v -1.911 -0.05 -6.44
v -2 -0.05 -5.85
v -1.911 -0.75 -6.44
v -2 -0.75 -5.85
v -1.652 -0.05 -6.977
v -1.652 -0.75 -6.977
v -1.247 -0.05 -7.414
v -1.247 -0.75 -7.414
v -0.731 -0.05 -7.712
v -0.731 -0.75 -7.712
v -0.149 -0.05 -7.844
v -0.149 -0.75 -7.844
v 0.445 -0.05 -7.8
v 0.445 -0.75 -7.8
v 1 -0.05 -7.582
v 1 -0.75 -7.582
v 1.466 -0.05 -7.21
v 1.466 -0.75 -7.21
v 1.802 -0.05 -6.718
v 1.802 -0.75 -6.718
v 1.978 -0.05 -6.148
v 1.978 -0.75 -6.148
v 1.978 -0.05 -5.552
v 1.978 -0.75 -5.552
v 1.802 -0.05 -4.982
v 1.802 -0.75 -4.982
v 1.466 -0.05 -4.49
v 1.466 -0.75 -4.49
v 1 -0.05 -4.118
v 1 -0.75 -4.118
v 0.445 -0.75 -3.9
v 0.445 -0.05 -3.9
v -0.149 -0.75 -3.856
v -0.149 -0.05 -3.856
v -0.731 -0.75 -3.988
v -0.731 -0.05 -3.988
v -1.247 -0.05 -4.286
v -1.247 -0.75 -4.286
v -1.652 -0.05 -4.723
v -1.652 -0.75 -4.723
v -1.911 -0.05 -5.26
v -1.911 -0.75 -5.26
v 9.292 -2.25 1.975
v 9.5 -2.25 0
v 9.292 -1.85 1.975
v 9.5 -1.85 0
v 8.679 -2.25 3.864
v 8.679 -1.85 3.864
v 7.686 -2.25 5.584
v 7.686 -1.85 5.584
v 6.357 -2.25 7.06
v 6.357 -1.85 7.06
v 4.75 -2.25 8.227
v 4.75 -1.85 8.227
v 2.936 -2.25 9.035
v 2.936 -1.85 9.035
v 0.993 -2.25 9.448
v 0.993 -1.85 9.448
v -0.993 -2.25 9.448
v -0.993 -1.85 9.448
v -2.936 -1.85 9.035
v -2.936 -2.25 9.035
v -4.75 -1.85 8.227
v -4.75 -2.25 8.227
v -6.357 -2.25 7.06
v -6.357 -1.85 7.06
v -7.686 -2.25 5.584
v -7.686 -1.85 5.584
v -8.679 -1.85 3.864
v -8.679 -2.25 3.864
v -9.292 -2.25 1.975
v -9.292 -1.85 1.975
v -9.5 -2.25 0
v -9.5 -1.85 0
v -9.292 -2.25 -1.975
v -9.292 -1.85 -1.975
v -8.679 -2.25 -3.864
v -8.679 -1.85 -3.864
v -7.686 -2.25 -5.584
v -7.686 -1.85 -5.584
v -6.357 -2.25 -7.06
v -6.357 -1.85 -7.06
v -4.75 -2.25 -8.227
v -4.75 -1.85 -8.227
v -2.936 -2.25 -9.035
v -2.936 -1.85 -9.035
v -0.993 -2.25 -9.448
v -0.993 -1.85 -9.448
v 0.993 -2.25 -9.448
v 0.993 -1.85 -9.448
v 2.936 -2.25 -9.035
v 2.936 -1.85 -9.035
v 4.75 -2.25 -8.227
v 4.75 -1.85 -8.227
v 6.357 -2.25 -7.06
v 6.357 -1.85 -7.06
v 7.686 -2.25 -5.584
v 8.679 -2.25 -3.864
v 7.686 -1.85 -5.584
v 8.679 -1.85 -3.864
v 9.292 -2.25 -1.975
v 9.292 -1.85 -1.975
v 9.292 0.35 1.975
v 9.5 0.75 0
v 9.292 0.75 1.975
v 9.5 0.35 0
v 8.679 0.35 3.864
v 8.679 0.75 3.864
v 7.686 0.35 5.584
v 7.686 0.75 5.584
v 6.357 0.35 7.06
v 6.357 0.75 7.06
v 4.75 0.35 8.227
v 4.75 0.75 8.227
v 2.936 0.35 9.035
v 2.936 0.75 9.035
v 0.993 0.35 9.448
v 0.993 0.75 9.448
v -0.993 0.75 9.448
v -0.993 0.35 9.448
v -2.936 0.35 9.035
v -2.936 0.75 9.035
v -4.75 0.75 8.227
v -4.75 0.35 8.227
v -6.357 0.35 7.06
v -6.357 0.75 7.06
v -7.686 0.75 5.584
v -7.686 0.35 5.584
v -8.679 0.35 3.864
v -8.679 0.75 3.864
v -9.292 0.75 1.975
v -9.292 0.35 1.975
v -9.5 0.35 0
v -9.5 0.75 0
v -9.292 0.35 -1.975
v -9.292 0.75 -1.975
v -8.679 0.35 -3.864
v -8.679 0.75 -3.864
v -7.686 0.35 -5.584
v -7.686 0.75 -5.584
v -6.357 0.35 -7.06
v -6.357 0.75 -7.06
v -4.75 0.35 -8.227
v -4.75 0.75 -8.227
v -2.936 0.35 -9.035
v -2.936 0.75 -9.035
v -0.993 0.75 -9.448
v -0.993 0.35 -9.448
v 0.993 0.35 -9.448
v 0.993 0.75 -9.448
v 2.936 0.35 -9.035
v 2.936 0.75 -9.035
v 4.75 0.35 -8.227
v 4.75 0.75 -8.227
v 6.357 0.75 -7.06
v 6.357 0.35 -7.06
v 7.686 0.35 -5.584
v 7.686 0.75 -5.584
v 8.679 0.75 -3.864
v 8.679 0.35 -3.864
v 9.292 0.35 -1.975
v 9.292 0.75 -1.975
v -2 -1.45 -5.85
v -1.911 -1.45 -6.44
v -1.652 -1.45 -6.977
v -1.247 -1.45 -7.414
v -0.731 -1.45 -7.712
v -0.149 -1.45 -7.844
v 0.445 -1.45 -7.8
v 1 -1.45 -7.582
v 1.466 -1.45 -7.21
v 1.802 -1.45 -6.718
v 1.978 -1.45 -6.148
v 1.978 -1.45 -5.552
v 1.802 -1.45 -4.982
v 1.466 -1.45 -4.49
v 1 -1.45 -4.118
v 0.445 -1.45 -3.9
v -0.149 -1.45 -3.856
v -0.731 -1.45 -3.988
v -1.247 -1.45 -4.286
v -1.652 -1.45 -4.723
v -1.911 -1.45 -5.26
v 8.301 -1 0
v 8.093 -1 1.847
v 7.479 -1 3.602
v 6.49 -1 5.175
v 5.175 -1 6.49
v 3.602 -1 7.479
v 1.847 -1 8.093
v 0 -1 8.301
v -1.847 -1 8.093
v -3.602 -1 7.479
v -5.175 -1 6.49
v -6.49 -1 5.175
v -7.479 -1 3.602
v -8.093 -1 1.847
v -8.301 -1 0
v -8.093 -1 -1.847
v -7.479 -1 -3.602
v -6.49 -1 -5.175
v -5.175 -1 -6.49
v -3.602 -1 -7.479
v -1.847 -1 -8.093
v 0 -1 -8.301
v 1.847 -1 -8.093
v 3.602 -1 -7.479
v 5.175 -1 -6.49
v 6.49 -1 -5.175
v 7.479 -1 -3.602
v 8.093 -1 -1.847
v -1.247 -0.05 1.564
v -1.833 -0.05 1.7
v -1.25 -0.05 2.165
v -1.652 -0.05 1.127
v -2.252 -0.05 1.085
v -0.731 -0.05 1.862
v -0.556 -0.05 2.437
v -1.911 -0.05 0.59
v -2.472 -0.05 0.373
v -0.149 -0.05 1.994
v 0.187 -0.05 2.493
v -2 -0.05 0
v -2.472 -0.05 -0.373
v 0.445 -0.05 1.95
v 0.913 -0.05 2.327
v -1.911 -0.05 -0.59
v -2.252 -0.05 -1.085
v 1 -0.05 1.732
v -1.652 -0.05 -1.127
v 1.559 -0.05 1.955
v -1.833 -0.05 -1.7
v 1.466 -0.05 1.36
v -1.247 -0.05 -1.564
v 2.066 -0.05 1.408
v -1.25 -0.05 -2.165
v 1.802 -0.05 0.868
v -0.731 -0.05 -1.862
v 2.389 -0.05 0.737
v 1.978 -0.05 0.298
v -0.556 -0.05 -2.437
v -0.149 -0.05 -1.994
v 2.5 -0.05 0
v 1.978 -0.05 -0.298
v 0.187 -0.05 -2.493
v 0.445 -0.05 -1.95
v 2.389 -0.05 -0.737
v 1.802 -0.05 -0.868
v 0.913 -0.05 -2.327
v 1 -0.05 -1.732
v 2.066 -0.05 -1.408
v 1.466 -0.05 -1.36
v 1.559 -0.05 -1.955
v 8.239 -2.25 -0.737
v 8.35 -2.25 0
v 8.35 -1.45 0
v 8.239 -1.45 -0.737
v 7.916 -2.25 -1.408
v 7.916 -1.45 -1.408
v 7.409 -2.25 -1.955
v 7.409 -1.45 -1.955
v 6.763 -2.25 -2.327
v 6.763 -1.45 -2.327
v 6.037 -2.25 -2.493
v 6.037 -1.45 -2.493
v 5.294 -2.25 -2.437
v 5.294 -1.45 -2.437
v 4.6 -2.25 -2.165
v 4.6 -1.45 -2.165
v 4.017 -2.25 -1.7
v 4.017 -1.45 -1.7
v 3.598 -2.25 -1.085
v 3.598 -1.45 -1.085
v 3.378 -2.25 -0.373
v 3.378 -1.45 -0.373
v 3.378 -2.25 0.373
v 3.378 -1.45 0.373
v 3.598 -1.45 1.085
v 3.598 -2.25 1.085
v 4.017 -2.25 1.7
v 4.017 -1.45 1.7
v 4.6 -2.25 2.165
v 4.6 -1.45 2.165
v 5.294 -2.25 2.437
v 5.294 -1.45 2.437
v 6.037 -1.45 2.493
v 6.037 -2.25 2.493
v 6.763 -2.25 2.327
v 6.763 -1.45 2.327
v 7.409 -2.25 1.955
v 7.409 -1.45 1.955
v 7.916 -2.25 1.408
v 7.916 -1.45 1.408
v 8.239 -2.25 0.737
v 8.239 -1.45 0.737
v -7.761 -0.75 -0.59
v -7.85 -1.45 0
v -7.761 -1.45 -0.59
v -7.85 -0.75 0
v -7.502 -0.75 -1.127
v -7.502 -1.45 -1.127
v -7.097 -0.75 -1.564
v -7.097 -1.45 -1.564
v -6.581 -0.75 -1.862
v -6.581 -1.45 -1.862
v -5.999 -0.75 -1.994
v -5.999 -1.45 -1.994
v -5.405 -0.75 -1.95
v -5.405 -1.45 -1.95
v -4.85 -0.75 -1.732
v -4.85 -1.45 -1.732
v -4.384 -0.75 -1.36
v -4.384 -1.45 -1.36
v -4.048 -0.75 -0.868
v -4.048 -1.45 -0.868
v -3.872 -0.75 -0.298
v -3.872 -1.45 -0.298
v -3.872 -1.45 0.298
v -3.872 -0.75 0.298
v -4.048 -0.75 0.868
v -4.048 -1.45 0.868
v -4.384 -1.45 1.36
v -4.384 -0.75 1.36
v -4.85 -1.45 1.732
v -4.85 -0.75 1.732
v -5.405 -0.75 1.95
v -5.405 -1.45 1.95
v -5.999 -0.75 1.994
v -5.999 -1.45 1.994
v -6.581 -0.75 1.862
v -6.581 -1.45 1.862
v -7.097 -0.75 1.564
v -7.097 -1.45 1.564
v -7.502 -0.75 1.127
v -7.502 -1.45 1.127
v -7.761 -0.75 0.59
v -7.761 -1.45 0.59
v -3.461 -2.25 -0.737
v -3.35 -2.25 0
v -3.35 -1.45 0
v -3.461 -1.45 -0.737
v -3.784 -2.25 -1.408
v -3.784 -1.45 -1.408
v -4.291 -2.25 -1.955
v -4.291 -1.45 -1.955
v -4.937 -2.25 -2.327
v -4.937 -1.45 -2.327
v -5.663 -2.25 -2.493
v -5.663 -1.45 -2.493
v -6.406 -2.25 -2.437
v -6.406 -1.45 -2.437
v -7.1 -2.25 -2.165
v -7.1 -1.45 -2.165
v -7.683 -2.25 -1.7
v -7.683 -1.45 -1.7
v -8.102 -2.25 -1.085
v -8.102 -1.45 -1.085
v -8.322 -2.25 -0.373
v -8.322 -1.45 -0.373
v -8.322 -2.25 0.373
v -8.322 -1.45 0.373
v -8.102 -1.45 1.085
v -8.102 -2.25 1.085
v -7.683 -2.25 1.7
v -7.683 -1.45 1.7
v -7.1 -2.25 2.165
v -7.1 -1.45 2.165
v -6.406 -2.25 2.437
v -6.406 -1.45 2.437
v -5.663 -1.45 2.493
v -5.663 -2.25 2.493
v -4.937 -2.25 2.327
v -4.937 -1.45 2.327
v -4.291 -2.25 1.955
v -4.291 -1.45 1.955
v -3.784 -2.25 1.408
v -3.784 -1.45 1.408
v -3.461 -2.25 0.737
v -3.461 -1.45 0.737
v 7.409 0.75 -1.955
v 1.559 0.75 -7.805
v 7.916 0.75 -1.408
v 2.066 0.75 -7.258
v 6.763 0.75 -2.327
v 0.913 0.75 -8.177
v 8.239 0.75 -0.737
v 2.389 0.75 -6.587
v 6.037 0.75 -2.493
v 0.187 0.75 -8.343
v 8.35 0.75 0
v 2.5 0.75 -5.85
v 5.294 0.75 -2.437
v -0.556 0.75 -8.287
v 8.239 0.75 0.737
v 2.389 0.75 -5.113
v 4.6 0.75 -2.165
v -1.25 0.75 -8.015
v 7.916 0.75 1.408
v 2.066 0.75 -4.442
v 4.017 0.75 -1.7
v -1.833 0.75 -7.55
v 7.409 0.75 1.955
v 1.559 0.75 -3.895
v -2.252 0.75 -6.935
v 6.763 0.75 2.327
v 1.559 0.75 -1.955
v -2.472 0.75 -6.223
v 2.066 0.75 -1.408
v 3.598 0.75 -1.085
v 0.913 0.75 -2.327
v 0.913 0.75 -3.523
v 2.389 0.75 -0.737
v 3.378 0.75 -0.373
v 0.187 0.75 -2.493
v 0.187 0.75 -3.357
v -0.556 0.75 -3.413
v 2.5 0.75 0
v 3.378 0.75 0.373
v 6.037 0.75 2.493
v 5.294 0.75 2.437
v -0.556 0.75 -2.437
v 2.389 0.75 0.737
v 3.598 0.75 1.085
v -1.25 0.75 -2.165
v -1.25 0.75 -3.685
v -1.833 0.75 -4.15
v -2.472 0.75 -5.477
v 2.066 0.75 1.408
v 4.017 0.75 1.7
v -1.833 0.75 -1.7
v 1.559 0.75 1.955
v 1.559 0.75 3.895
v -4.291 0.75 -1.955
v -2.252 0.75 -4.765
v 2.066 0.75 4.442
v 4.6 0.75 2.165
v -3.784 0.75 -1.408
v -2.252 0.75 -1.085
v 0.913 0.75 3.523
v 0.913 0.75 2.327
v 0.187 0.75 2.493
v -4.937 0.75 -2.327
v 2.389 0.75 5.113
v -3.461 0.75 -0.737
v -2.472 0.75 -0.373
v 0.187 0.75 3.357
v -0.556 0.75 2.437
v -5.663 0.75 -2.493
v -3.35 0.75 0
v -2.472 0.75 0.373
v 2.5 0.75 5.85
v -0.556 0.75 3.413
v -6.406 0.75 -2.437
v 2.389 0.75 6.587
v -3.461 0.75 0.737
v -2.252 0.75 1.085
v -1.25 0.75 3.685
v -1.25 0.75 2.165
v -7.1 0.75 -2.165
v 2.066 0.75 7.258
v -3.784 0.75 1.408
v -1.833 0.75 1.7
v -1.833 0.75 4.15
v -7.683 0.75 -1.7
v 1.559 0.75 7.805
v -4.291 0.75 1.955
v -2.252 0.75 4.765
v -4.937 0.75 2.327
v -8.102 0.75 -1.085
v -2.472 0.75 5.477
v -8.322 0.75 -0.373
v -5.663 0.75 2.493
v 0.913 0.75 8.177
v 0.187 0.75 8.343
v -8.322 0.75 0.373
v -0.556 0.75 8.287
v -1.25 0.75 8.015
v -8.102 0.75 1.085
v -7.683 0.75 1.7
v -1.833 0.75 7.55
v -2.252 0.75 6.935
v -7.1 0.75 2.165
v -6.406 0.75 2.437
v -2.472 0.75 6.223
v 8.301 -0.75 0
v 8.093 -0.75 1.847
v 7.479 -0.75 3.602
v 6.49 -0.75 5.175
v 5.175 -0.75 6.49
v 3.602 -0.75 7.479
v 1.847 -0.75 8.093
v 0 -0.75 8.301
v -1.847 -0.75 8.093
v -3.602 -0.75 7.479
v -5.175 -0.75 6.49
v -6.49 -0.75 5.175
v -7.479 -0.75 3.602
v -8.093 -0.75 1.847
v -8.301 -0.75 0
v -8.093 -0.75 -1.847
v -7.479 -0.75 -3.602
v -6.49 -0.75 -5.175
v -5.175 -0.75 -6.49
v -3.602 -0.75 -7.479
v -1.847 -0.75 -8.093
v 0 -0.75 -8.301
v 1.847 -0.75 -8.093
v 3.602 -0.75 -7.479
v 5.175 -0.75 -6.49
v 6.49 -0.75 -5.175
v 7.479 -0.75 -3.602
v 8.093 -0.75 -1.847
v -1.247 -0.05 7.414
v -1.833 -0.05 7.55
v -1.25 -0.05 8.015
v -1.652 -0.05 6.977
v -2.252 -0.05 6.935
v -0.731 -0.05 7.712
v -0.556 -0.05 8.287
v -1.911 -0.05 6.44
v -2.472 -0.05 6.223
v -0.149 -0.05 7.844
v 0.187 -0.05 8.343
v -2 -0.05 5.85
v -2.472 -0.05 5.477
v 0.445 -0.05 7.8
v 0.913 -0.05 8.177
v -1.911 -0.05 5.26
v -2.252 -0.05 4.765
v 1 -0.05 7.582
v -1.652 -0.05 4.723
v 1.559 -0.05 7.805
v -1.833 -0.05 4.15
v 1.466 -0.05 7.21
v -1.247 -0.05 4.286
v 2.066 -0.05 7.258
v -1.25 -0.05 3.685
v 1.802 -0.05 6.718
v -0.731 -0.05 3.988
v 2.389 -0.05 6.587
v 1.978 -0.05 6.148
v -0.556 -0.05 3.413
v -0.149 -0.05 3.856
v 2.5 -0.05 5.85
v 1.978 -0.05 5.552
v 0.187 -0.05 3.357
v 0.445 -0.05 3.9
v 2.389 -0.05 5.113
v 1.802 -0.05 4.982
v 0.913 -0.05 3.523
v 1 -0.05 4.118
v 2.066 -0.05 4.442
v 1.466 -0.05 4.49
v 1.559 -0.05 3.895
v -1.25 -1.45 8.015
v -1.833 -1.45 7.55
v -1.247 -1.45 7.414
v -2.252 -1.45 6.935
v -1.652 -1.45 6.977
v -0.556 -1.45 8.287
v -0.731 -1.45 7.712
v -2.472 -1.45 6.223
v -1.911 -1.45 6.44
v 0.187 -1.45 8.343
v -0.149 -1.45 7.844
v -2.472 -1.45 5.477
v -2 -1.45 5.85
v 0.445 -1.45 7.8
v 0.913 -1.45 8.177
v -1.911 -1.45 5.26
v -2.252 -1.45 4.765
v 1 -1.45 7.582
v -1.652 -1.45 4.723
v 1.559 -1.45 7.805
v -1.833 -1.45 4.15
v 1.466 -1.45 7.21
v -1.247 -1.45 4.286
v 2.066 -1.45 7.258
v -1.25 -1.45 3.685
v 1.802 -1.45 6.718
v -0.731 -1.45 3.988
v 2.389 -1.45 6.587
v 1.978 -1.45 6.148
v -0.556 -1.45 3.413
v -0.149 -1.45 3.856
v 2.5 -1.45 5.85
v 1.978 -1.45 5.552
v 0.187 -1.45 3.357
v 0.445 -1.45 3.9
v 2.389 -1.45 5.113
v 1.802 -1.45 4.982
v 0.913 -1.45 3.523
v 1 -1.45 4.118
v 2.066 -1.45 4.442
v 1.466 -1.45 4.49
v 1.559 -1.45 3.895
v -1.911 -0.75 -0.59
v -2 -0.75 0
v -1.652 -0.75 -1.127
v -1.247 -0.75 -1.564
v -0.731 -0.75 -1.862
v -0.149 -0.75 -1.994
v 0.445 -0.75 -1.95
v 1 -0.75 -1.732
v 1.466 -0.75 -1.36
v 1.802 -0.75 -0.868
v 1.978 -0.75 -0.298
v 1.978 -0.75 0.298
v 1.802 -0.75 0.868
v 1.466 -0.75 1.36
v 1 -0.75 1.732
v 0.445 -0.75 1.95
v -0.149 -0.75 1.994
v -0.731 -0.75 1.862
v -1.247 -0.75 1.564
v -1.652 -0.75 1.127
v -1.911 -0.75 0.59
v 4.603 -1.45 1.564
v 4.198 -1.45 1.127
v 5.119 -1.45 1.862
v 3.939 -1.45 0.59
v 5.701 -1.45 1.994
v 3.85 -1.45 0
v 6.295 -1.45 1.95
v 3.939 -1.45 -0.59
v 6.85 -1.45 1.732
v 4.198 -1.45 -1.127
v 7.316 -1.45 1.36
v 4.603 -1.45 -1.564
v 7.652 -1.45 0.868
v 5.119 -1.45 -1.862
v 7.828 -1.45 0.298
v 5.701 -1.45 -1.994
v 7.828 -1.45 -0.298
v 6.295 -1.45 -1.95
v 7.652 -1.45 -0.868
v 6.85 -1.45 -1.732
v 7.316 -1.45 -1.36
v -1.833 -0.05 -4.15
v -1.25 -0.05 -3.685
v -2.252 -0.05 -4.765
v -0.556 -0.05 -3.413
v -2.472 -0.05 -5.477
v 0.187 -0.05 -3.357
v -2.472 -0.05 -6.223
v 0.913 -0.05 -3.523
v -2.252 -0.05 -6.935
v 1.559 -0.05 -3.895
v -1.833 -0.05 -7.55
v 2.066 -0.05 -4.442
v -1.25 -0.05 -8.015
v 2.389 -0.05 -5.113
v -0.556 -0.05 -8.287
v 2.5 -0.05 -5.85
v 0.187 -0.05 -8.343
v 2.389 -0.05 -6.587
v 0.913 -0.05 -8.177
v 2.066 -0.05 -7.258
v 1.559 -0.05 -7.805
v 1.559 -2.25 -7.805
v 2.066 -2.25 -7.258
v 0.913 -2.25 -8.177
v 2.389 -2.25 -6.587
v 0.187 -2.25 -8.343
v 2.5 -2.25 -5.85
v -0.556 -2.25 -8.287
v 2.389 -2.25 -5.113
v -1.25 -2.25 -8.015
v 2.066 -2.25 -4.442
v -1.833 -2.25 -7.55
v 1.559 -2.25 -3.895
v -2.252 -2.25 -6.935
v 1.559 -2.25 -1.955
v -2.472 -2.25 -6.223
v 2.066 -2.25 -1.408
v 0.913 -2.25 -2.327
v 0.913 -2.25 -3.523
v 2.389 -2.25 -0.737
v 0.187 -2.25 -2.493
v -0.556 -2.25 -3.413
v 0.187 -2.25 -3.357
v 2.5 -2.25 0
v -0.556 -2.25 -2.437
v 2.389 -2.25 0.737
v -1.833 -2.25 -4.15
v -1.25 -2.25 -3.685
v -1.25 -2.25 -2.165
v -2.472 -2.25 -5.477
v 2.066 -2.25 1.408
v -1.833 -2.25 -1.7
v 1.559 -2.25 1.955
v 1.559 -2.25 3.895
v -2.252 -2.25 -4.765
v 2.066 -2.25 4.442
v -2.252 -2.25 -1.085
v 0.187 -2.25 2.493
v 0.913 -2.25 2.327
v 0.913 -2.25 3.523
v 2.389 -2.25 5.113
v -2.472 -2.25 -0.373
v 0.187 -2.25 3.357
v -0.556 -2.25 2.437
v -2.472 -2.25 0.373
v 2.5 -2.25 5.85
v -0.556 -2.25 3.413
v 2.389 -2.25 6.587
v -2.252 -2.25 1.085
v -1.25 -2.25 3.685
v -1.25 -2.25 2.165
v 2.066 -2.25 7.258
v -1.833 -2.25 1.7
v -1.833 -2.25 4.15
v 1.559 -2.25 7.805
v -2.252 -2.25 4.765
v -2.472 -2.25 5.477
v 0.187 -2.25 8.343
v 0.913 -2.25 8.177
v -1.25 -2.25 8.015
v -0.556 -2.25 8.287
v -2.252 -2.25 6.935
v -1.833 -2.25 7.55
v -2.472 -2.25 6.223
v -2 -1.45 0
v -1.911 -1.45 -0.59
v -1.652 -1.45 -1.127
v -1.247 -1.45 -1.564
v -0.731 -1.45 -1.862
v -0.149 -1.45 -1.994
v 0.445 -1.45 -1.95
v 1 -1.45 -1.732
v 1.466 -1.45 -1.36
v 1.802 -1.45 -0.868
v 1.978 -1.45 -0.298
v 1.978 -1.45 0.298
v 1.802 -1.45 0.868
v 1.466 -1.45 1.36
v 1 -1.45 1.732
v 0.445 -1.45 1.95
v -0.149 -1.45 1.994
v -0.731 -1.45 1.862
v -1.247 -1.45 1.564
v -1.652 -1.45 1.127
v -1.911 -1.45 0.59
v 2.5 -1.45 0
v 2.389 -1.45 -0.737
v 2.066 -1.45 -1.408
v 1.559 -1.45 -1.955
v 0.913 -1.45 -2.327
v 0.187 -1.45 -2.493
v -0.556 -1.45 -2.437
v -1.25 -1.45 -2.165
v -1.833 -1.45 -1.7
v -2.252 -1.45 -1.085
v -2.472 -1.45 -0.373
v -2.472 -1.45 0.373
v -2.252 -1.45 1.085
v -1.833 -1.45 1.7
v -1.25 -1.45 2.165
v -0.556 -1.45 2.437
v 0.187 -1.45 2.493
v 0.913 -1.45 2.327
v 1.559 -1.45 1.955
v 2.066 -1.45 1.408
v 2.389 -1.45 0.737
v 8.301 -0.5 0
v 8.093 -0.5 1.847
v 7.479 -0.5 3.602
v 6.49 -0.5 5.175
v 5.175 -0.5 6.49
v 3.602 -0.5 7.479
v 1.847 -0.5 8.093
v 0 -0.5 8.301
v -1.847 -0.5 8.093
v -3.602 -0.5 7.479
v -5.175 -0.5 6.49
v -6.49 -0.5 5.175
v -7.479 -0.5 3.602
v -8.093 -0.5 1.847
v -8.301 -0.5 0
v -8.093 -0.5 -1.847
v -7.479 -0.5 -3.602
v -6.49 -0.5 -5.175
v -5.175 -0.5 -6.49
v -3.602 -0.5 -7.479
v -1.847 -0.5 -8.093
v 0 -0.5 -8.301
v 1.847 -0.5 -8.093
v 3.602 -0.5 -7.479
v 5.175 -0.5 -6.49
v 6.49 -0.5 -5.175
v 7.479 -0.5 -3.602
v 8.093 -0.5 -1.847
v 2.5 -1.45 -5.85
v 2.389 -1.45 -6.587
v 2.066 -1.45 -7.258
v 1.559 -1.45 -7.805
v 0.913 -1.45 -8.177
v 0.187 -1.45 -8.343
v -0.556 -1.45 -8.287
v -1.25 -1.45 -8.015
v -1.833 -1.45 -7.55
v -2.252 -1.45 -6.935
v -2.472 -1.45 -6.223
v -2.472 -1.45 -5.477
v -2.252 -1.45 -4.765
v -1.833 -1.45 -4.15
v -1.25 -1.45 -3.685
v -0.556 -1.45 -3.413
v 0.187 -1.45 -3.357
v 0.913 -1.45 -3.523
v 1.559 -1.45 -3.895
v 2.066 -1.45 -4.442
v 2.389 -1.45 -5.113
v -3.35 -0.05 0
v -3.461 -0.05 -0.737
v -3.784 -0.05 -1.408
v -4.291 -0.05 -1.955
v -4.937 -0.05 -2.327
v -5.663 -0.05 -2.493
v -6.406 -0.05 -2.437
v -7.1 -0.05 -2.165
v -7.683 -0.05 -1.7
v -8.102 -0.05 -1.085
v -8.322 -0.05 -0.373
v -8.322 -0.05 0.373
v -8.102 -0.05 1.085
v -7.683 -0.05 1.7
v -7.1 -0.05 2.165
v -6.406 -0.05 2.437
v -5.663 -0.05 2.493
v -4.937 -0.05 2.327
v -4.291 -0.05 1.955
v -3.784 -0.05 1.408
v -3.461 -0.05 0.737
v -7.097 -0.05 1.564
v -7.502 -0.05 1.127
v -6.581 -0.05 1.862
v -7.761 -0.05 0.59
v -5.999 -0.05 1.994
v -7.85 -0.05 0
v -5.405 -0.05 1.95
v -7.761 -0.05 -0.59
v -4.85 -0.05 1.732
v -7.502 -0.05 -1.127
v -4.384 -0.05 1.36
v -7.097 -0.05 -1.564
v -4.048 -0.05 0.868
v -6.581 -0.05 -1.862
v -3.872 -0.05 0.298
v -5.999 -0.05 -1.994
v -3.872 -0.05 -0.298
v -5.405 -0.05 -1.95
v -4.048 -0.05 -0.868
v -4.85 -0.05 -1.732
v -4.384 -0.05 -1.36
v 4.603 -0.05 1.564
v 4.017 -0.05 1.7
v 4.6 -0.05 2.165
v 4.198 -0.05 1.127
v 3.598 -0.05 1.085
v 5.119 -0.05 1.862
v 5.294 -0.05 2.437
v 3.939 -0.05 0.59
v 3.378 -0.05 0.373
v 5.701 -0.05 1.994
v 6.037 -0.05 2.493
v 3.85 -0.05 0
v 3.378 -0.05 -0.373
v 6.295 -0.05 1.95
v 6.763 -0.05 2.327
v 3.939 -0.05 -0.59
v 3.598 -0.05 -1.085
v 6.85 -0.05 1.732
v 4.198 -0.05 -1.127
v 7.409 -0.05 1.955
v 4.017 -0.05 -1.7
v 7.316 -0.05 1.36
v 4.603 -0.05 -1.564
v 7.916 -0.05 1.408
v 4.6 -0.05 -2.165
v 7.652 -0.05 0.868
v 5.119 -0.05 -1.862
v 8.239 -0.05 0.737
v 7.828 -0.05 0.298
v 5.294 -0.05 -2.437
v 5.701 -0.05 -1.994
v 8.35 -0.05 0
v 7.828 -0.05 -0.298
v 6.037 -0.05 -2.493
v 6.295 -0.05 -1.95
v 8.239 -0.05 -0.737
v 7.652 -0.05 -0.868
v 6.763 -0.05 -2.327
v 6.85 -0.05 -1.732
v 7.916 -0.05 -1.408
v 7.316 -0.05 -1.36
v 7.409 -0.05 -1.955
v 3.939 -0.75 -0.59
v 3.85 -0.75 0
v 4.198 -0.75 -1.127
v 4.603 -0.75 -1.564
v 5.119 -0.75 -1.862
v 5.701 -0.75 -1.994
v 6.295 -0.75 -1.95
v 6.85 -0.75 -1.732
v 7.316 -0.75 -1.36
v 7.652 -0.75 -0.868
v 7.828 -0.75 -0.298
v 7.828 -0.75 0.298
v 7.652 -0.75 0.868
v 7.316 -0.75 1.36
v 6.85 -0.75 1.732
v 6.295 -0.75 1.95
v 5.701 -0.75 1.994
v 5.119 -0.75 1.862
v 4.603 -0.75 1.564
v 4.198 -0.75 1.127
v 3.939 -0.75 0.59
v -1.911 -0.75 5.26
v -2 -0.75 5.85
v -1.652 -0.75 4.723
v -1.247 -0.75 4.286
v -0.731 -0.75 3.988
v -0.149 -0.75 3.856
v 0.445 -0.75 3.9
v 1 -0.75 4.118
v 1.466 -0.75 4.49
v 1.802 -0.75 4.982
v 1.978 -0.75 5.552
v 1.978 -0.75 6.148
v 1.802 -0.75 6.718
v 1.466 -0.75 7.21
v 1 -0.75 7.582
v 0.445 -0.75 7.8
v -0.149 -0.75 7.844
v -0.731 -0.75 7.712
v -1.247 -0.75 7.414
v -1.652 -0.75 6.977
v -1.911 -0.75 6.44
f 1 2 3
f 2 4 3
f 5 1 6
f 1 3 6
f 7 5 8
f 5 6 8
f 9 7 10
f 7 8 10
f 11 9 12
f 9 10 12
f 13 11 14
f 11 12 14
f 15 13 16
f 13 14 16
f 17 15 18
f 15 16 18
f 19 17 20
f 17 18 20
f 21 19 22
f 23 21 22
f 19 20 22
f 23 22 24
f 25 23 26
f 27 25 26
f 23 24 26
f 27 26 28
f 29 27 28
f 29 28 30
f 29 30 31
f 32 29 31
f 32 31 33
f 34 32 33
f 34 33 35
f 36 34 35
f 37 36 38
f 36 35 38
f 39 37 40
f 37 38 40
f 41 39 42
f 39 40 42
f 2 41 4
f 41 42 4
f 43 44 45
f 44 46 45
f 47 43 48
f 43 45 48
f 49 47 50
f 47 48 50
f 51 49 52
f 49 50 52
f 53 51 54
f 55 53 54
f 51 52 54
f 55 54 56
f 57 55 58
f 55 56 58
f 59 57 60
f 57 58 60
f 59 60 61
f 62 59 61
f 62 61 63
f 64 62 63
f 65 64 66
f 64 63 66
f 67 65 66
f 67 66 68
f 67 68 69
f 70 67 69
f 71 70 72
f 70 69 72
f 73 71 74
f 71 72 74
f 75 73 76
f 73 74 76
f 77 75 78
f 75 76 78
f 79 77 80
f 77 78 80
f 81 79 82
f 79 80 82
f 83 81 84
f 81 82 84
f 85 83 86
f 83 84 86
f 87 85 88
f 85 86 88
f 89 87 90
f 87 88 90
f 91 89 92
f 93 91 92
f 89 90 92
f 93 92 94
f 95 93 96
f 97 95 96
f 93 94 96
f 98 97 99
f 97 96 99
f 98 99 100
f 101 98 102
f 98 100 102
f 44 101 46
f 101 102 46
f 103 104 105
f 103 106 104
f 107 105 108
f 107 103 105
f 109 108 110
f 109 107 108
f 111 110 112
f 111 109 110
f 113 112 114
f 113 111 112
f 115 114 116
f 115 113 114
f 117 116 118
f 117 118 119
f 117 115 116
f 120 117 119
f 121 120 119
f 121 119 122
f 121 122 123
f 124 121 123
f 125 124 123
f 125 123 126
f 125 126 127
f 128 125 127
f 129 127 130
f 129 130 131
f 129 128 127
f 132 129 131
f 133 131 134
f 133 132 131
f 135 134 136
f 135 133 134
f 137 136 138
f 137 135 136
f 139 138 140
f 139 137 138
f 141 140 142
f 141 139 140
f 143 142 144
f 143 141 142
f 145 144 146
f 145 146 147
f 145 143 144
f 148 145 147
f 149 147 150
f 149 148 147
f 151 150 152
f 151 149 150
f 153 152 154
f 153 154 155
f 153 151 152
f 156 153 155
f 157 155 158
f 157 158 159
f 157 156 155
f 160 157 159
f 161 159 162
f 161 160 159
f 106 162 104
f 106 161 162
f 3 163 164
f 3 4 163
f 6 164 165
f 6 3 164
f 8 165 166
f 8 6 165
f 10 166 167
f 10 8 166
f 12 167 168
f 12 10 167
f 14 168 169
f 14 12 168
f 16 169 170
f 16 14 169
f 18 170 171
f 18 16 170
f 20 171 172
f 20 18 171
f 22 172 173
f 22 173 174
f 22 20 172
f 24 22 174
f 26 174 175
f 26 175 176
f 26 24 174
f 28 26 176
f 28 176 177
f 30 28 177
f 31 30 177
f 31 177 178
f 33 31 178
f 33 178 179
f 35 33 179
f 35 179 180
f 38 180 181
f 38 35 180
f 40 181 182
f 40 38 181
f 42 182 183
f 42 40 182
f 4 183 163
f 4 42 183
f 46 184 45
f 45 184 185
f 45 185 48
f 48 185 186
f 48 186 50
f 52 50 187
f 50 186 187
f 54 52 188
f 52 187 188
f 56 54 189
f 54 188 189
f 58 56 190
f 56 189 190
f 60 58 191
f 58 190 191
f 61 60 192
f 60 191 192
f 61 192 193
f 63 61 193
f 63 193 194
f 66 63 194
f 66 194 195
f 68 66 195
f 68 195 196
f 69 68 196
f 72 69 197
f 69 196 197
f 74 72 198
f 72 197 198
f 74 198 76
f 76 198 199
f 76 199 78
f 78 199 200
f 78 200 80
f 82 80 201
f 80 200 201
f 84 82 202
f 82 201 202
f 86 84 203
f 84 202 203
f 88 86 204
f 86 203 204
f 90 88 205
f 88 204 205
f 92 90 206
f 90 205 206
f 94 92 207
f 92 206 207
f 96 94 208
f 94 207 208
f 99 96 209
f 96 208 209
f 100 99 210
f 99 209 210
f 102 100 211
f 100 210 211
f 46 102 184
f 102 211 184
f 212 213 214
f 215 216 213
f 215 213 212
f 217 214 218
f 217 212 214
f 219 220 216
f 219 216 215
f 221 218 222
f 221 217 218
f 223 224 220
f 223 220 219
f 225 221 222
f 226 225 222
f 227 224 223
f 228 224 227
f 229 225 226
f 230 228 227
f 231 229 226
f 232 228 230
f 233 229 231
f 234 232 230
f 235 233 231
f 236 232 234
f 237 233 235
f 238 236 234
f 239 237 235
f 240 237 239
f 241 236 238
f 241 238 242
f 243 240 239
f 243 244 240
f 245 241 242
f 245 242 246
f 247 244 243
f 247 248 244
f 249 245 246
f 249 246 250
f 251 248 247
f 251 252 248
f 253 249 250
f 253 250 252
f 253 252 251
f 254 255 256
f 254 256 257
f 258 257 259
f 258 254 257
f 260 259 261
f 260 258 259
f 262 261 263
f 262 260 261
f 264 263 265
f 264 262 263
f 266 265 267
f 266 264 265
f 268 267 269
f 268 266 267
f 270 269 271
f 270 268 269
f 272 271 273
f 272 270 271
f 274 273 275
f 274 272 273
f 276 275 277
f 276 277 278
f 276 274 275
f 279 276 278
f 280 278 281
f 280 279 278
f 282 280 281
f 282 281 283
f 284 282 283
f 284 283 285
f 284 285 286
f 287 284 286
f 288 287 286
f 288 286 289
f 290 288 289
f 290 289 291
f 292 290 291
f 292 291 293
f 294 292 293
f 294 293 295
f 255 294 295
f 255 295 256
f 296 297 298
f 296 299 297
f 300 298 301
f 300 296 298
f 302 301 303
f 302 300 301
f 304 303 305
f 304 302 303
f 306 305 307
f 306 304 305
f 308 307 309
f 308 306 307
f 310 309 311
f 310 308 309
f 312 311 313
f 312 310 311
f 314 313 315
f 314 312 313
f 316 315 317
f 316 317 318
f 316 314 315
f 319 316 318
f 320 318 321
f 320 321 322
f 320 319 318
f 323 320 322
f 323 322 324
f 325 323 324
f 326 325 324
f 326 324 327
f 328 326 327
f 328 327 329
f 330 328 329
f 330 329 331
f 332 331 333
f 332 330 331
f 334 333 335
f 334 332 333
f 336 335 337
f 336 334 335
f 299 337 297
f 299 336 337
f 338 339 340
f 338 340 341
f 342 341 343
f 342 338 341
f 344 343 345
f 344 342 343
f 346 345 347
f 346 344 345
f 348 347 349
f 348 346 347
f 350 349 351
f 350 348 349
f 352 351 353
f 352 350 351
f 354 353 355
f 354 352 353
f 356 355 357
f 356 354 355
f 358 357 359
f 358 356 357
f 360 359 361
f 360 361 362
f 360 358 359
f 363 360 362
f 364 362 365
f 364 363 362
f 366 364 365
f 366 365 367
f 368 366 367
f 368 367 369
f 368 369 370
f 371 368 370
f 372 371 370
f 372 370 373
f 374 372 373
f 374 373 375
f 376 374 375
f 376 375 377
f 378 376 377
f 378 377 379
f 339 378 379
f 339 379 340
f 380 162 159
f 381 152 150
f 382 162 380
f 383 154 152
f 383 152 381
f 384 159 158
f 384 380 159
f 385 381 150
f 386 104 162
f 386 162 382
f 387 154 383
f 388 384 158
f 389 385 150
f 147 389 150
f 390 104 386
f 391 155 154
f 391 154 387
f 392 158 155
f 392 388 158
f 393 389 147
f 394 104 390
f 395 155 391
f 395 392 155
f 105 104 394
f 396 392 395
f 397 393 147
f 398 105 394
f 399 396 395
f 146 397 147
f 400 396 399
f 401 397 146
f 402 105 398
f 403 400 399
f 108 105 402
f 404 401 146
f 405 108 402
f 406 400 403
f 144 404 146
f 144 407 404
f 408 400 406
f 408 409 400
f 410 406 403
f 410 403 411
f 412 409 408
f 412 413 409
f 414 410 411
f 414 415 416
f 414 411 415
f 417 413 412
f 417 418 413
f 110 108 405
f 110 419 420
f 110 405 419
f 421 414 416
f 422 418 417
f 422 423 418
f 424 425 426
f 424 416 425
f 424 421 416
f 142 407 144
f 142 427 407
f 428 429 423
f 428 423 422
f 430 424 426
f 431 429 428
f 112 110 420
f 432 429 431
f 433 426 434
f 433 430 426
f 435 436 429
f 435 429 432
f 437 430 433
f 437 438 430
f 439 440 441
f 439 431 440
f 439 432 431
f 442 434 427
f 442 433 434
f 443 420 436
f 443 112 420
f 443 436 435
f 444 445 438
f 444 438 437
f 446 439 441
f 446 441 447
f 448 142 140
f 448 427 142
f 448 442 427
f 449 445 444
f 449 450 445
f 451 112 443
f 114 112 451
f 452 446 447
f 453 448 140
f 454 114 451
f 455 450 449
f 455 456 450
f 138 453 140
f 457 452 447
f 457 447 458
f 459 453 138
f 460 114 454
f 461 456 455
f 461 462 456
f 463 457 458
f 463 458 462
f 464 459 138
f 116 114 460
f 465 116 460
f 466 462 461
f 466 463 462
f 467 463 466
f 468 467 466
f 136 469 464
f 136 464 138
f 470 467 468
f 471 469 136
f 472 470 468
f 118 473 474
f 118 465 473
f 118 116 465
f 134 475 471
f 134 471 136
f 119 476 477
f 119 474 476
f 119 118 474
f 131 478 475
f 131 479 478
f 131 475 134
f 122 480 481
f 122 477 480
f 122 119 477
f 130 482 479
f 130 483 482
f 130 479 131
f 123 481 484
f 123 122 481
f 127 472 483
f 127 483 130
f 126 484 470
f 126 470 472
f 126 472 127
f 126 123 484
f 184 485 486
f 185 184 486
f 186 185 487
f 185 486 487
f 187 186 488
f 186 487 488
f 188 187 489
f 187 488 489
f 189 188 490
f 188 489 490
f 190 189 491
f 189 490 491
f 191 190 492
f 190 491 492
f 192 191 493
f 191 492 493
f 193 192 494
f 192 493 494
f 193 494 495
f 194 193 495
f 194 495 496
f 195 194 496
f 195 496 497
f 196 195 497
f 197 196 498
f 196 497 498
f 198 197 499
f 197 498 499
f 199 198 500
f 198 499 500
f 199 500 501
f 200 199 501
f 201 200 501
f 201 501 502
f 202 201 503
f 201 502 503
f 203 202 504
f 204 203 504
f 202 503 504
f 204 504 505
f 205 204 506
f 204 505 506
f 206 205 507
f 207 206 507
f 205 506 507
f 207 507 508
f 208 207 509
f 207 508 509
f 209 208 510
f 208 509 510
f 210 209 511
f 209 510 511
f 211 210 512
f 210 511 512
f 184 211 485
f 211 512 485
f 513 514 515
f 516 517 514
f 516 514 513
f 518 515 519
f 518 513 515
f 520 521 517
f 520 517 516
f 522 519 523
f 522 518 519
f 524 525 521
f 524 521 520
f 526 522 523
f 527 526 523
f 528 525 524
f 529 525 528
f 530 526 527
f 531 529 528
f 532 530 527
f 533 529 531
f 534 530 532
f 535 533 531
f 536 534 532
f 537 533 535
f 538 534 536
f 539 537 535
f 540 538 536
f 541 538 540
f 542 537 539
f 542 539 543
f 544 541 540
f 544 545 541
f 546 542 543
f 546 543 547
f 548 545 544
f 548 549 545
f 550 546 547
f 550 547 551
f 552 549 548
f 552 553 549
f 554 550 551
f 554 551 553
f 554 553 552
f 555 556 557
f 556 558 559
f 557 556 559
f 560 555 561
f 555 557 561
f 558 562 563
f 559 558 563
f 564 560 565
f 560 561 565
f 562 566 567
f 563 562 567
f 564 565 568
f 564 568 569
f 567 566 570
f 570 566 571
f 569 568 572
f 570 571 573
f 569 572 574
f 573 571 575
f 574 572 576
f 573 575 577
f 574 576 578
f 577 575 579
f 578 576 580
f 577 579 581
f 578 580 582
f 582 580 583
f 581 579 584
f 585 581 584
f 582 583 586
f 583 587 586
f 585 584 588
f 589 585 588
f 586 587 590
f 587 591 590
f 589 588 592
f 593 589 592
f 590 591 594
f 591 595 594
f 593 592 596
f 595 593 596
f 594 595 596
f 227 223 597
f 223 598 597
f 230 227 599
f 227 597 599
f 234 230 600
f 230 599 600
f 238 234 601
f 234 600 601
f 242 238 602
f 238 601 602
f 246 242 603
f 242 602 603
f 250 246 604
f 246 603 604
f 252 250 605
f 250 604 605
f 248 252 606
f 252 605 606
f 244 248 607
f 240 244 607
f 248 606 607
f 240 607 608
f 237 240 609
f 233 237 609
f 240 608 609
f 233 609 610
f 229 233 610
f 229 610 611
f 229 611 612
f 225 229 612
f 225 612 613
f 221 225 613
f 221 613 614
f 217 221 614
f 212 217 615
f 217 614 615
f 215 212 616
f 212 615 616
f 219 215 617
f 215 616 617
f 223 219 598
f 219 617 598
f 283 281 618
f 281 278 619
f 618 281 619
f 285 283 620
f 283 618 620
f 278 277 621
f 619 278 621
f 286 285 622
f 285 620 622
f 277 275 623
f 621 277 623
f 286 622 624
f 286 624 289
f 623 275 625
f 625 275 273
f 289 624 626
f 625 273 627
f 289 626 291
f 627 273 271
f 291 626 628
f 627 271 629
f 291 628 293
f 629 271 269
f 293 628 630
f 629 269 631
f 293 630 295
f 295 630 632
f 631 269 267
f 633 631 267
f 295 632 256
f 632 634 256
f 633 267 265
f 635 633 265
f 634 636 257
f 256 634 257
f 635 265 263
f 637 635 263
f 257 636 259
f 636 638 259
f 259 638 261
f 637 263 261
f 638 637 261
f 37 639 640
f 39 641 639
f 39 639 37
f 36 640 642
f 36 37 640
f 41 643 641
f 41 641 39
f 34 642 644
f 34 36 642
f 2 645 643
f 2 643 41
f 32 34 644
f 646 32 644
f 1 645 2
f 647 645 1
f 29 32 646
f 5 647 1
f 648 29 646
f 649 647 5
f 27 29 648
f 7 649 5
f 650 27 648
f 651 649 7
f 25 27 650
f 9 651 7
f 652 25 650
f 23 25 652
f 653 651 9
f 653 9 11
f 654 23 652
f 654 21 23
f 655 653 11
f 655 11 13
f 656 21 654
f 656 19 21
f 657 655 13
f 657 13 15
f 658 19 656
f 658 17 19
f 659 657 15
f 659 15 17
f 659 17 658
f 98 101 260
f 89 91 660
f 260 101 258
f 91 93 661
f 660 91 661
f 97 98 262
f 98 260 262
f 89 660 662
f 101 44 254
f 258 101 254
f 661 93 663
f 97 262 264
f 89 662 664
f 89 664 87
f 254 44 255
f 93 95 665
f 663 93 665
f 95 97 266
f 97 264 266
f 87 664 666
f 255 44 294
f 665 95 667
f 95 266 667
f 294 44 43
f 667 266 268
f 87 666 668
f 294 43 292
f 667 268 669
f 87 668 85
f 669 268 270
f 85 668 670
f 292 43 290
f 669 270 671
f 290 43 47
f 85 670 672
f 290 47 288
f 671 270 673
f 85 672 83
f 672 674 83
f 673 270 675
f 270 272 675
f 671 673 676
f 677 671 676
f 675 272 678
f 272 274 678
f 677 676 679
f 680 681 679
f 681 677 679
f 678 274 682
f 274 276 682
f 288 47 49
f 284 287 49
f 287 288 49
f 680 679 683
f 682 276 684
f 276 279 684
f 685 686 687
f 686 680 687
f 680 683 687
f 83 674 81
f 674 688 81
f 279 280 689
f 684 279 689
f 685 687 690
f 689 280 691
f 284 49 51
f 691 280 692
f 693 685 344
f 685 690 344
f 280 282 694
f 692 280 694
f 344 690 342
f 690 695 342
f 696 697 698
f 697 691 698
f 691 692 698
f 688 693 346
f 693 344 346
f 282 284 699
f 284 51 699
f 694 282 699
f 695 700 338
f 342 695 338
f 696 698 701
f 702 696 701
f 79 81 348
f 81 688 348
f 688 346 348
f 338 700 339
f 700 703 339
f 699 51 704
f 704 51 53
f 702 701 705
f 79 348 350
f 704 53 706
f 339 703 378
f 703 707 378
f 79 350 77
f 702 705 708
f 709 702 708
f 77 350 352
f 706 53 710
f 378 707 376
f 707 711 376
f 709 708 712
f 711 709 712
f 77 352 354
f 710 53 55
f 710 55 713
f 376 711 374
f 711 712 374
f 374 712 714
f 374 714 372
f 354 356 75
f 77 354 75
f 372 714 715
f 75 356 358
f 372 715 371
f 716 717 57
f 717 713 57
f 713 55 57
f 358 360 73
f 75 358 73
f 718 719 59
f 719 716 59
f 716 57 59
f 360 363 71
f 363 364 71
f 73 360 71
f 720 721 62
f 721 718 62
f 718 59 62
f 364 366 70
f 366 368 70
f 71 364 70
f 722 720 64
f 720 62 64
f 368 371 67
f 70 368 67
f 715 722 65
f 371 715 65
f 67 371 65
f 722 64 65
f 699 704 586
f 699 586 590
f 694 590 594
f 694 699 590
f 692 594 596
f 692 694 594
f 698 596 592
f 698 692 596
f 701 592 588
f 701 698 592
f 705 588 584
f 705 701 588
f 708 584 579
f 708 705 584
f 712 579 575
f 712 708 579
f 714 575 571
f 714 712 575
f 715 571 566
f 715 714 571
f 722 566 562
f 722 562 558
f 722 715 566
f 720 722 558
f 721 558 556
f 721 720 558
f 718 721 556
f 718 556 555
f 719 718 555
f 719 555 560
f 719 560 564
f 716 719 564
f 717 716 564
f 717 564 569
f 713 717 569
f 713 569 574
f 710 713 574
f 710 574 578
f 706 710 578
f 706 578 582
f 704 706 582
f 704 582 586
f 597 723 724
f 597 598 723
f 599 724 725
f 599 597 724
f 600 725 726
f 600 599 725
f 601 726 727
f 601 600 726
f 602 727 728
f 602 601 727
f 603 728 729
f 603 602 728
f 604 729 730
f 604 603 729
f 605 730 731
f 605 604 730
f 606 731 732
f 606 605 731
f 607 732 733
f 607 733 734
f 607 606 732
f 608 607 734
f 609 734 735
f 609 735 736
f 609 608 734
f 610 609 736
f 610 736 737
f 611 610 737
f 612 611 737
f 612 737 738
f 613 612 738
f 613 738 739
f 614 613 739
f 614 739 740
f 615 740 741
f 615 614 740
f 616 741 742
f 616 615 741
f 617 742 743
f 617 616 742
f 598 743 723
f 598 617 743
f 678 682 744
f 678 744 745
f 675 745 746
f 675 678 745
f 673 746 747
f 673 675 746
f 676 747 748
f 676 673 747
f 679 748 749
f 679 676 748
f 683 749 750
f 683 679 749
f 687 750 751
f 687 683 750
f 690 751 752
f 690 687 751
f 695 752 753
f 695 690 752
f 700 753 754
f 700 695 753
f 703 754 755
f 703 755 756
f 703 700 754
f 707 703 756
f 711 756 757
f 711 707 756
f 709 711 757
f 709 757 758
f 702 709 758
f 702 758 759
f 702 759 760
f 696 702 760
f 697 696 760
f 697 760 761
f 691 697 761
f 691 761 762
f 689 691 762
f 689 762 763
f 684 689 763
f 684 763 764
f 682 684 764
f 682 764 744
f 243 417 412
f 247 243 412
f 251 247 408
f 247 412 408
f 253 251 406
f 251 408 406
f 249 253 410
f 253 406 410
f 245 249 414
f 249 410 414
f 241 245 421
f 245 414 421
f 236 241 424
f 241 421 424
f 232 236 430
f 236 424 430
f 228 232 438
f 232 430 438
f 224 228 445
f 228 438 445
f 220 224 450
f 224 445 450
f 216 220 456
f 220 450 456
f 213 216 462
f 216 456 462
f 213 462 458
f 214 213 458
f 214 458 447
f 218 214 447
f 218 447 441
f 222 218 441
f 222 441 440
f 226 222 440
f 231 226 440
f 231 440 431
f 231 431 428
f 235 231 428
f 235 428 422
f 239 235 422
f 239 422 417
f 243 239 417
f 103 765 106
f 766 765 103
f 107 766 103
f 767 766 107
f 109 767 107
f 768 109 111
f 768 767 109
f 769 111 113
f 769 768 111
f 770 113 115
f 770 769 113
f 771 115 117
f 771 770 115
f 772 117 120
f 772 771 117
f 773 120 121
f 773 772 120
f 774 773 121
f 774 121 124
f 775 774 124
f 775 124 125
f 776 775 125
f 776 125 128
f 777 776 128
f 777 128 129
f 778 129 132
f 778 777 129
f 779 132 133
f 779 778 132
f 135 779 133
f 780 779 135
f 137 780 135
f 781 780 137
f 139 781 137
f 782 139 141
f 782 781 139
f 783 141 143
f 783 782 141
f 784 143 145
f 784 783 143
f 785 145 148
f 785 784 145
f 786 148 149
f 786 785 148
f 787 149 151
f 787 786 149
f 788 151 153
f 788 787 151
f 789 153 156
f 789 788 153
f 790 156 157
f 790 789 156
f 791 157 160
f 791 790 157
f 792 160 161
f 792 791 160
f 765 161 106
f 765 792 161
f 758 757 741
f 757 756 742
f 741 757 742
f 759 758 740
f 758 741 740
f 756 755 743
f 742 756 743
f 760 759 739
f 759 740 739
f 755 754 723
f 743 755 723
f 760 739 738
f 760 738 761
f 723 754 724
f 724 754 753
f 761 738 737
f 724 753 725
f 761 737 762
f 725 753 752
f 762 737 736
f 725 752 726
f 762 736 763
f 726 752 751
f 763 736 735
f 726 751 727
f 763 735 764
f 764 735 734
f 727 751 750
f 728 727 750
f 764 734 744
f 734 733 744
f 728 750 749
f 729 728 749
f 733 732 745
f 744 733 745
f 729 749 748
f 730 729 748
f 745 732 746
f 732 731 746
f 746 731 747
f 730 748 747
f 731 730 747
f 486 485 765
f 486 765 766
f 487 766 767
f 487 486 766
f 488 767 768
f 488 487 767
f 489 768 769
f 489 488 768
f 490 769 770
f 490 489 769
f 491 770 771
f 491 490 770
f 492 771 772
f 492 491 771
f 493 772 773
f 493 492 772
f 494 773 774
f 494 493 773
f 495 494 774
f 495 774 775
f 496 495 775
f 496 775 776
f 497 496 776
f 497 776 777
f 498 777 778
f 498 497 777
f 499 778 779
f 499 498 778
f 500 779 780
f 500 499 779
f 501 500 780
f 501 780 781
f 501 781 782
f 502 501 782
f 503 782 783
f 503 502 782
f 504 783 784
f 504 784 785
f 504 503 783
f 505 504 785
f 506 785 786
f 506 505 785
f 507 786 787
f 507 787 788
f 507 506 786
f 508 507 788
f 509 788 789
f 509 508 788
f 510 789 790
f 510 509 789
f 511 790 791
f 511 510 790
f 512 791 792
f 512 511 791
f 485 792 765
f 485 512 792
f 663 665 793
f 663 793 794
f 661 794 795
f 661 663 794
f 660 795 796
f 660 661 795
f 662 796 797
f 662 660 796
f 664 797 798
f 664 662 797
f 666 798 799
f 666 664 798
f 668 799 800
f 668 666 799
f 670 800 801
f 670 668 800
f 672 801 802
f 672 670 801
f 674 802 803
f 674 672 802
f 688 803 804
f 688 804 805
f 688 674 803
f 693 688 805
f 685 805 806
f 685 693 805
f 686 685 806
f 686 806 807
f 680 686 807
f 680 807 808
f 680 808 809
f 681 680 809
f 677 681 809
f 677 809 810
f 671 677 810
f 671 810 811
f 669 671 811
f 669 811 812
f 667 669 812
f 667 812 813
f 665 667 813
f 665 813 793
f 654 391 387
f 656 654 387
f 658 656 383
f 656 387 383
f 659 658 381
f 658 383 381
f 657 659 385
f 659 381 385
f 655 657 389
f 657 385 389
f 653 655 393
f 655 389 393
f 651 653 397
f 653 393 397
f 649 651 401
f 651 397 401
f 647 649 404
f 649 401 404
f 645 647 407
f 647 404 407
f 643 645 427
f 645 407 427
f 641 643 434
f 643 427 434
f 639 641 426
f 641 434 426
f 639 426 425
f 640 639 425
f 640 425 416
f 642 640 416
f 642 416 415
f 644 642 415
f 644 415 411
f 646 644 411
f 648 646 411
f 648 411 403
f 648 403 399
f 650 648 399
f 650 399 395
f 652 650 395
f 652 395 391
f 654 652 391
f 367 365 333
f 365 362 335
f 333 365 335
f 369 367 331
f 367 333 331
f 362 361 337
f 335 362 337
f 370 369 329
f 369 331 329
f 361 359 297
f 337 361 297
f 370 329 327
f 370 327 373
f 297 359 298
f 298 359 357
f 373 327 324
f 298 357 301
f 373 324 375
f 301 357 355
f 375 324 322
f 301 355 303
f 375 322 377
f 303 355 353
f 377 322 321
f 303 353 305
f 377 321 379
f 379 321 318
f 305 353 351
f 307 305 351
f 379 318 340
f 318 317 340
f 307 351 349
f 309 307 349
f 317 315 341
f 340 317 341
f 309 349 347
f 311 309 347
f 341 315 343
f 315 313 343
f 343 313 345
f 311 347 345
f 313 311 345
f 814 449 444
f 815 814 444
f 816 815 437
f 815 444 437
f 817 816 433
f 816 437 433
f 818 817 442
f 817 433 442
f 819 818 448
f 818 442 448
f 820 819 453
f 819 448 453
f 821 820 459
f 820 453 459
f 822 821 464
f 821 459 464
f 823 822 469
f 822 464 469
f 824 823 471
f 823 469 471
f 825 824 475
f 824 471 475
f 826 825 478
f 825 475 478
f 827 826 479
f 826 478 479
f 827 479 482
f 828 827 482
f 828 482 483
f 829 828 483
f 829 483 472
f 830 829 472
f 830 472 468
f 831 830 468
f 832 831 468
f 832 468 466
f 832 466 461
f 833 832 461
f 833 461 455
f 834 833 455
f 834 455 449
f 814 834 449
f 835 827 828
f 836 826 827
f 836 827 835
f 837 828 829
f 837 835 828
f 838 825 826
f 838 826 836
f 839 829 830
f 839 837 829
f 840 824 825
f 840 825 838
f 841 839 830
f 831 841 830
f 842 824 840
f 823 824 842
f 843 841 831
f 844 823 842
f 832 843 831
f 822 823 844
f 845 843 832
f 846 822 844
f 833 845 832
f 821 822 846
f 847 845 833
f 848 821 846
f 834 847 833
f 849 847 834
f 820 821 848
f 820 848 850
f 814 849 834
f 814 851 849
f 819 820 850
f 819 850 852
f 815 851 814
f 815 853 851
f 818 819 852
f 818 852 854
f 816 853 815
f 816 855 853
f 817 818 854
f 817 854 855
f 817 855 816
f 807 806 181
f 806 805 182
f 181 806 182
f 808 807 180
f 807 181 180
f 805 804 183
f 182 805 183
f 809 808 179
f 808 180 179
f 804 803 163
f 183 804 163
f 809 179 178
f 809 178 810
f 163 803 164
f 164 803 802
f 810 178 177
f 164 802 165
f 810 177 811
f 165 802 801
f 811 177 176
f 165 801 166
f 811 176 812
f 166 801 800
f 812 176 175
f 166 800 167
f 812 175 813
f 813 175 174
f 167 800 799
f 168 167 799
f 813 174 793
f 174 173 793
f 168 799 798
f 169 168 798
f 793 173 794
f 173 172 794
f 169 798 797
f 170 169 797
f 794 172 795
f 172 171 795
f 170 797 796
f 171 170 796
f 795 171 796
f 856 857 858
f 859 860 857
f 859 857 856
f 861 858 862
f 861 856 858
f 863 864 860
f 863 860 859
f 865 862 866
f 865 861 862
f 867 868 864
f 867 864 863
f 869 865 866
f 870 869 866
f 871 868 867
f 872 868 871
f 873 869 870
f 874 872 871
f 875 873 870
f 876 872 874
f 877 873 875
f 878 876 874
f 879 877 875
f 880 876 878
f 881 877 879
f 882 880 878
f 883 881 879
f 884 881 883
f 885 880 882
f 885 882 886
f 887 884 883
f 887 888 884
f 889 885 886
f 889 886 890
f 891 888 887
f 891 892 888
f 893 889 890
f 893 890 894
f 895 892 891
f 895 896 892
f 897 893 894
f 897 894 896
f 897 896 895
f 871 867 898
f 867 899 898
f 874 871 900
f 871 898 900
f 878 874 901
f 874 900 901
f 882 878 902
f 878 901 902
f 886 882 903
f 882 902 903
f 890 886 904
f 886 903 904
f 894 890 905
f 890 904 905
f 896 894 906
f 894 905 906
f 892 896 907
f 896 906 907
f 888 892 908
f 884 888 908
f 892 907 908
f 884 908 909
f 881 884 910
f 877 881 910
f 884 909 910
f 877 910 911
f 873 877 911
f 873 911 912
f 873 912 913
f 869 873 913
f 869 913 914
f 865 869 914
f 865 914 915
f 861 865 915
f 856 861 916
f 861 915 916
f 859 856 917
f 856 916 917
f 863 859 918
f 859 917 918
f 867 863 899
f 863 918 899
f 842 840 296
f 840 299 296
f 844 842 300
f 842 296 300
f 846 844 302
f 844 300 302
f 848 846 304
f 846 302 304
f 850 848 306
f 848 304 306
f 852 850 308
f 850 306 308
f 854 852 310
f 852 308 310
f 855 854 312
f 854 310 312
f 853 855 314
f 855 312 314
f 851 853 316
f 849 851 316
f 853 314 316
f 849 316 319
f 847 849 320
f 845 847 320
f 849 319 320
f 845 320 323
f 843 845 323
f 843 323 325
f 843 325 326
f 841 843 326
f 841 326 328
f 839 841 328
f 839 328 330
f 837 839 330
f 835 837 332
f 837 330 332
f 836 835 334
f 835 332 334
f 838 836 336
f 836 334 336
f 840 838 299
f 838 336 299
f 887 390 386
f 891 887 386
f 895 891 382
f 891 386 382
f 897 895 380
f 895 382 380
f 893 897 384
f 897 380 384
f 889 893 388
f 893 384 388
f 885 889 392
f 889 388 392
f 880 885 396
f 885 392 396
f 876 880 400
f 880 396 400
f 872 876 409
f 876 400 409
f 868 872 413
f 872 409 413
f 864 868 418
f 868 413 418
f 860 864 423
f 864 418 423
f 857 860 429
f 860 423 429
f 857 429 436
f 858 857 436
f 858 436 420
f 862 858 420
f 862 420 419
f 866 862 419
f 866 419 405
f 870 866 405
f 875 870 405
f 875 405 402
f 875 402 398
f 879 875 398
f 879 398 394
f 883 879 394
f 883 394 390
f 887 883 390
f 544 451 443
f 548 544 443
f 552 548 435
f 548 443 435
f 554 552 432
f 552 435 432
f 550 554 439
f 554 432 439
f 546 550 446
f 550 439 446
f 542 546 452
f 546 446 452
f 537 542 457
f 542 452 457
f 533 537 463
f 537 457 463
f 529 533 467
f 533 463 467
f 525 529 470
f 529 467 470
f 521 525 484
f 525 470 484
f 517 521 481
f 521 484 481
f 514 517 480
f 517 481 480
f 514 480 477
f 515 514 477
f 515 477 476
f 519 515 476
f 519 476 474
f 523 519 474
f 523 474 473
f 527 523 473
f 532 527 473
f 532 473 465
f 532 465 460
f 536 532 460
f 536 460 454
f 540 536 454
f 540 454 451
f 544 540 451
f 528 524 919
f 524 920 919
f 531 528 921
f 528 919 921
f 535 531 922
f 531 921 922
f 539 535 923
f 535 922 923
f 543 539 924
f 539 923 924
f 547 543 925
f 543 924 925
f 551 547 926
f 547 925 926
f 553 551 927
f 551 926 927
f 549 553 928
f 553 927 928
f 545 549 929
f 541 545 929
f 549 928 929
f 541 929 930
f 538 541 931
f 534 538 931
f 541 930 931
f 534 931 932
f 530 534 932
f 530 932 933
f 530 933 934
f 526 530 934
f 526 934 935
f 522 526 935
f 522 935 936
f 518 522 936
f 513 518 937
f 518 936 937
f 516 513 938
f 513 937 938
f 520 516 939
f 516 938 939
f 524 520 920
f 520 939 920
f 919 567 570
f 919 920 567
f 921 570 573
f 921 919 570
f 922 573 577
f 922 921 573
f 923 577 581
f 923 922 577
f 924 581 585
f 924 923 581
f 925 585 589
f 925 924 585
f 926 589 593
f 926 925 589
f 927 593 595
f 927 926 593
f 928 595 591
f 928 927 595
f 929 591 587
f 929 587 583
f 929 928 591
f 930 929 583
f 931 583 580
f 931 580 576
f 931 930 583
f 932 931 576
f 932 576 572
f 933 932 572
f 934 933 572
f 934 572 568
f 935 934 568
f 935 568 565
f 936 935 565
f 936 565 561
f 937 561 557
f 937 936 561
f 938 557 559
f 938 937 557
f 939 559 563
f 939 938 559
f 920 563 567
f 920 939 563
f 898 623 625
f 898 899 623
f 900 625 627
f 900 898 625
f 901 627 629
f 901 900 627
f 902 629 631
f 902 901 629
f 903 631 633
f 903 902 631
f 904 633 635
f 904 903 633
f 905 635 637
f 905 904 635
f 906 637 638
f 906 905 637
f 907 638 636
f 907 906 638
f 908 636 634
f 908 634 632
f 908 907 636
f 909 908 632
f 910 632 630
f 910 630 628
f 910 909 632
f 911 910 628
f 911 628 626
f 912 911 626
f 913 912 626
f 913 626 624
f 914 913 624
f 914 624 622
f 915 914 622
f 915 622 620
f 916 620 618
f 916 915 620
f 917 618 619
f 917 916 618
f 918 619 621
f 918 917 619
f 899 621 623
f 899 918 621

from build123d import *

# Parameters (mm, degrees)
HOLE1_D           = 4
HOLE1_DEPTH       = 1.5
HOLE1_CBORE_D     = 5
HOLE1_CBORE_DEPTH = 0.8
HOLE1_TIP         = 1.201721238


with BuildPart() as part:
    # Sketch2 → Revolve1 (revolve)
    with BuildSketch(Plane.XY):
        Polygon((9.5, 0.75), (9.5, 0.35), (8.300666852, -0.5), (8.300666852, -0.75), (0, -0.75), (0, 0.75), align=None)
    revolve(axis=Axis((0, 0.75, 0), (0, -1, 0)))

    # Hole1
    with Locations(Plane(origin=(0, 0.75, 0), x_dir=(1, 0, 0), z_dir=(0, 1, 0))):
        with Locations((0, 0), (-5.85, 0), (5.85, 0), (0, 5.85), (0, -5.85)):
            CounterBoreHole(HOLE1_D / 2, HOLE1_CBORE_D / 2, HOLE1_CBORE_DEPTH, depth=HOLE1_DEPTH)
            with Locations((0, 0, -(HOLE1_DEPTH + HOLE1_TIP / 2))):  # 118° drill point
                Cone(0, HOLE1_D / 2, HOLE1_TIP, mode=Mode.SUBTRACT)

    # Mirror1: part across plane


with BuildPart() as part_1:
    add(part.part)
    add(part.part.mirror(Plane.ZX.offset(-0.75)))


solid = part_1.part
